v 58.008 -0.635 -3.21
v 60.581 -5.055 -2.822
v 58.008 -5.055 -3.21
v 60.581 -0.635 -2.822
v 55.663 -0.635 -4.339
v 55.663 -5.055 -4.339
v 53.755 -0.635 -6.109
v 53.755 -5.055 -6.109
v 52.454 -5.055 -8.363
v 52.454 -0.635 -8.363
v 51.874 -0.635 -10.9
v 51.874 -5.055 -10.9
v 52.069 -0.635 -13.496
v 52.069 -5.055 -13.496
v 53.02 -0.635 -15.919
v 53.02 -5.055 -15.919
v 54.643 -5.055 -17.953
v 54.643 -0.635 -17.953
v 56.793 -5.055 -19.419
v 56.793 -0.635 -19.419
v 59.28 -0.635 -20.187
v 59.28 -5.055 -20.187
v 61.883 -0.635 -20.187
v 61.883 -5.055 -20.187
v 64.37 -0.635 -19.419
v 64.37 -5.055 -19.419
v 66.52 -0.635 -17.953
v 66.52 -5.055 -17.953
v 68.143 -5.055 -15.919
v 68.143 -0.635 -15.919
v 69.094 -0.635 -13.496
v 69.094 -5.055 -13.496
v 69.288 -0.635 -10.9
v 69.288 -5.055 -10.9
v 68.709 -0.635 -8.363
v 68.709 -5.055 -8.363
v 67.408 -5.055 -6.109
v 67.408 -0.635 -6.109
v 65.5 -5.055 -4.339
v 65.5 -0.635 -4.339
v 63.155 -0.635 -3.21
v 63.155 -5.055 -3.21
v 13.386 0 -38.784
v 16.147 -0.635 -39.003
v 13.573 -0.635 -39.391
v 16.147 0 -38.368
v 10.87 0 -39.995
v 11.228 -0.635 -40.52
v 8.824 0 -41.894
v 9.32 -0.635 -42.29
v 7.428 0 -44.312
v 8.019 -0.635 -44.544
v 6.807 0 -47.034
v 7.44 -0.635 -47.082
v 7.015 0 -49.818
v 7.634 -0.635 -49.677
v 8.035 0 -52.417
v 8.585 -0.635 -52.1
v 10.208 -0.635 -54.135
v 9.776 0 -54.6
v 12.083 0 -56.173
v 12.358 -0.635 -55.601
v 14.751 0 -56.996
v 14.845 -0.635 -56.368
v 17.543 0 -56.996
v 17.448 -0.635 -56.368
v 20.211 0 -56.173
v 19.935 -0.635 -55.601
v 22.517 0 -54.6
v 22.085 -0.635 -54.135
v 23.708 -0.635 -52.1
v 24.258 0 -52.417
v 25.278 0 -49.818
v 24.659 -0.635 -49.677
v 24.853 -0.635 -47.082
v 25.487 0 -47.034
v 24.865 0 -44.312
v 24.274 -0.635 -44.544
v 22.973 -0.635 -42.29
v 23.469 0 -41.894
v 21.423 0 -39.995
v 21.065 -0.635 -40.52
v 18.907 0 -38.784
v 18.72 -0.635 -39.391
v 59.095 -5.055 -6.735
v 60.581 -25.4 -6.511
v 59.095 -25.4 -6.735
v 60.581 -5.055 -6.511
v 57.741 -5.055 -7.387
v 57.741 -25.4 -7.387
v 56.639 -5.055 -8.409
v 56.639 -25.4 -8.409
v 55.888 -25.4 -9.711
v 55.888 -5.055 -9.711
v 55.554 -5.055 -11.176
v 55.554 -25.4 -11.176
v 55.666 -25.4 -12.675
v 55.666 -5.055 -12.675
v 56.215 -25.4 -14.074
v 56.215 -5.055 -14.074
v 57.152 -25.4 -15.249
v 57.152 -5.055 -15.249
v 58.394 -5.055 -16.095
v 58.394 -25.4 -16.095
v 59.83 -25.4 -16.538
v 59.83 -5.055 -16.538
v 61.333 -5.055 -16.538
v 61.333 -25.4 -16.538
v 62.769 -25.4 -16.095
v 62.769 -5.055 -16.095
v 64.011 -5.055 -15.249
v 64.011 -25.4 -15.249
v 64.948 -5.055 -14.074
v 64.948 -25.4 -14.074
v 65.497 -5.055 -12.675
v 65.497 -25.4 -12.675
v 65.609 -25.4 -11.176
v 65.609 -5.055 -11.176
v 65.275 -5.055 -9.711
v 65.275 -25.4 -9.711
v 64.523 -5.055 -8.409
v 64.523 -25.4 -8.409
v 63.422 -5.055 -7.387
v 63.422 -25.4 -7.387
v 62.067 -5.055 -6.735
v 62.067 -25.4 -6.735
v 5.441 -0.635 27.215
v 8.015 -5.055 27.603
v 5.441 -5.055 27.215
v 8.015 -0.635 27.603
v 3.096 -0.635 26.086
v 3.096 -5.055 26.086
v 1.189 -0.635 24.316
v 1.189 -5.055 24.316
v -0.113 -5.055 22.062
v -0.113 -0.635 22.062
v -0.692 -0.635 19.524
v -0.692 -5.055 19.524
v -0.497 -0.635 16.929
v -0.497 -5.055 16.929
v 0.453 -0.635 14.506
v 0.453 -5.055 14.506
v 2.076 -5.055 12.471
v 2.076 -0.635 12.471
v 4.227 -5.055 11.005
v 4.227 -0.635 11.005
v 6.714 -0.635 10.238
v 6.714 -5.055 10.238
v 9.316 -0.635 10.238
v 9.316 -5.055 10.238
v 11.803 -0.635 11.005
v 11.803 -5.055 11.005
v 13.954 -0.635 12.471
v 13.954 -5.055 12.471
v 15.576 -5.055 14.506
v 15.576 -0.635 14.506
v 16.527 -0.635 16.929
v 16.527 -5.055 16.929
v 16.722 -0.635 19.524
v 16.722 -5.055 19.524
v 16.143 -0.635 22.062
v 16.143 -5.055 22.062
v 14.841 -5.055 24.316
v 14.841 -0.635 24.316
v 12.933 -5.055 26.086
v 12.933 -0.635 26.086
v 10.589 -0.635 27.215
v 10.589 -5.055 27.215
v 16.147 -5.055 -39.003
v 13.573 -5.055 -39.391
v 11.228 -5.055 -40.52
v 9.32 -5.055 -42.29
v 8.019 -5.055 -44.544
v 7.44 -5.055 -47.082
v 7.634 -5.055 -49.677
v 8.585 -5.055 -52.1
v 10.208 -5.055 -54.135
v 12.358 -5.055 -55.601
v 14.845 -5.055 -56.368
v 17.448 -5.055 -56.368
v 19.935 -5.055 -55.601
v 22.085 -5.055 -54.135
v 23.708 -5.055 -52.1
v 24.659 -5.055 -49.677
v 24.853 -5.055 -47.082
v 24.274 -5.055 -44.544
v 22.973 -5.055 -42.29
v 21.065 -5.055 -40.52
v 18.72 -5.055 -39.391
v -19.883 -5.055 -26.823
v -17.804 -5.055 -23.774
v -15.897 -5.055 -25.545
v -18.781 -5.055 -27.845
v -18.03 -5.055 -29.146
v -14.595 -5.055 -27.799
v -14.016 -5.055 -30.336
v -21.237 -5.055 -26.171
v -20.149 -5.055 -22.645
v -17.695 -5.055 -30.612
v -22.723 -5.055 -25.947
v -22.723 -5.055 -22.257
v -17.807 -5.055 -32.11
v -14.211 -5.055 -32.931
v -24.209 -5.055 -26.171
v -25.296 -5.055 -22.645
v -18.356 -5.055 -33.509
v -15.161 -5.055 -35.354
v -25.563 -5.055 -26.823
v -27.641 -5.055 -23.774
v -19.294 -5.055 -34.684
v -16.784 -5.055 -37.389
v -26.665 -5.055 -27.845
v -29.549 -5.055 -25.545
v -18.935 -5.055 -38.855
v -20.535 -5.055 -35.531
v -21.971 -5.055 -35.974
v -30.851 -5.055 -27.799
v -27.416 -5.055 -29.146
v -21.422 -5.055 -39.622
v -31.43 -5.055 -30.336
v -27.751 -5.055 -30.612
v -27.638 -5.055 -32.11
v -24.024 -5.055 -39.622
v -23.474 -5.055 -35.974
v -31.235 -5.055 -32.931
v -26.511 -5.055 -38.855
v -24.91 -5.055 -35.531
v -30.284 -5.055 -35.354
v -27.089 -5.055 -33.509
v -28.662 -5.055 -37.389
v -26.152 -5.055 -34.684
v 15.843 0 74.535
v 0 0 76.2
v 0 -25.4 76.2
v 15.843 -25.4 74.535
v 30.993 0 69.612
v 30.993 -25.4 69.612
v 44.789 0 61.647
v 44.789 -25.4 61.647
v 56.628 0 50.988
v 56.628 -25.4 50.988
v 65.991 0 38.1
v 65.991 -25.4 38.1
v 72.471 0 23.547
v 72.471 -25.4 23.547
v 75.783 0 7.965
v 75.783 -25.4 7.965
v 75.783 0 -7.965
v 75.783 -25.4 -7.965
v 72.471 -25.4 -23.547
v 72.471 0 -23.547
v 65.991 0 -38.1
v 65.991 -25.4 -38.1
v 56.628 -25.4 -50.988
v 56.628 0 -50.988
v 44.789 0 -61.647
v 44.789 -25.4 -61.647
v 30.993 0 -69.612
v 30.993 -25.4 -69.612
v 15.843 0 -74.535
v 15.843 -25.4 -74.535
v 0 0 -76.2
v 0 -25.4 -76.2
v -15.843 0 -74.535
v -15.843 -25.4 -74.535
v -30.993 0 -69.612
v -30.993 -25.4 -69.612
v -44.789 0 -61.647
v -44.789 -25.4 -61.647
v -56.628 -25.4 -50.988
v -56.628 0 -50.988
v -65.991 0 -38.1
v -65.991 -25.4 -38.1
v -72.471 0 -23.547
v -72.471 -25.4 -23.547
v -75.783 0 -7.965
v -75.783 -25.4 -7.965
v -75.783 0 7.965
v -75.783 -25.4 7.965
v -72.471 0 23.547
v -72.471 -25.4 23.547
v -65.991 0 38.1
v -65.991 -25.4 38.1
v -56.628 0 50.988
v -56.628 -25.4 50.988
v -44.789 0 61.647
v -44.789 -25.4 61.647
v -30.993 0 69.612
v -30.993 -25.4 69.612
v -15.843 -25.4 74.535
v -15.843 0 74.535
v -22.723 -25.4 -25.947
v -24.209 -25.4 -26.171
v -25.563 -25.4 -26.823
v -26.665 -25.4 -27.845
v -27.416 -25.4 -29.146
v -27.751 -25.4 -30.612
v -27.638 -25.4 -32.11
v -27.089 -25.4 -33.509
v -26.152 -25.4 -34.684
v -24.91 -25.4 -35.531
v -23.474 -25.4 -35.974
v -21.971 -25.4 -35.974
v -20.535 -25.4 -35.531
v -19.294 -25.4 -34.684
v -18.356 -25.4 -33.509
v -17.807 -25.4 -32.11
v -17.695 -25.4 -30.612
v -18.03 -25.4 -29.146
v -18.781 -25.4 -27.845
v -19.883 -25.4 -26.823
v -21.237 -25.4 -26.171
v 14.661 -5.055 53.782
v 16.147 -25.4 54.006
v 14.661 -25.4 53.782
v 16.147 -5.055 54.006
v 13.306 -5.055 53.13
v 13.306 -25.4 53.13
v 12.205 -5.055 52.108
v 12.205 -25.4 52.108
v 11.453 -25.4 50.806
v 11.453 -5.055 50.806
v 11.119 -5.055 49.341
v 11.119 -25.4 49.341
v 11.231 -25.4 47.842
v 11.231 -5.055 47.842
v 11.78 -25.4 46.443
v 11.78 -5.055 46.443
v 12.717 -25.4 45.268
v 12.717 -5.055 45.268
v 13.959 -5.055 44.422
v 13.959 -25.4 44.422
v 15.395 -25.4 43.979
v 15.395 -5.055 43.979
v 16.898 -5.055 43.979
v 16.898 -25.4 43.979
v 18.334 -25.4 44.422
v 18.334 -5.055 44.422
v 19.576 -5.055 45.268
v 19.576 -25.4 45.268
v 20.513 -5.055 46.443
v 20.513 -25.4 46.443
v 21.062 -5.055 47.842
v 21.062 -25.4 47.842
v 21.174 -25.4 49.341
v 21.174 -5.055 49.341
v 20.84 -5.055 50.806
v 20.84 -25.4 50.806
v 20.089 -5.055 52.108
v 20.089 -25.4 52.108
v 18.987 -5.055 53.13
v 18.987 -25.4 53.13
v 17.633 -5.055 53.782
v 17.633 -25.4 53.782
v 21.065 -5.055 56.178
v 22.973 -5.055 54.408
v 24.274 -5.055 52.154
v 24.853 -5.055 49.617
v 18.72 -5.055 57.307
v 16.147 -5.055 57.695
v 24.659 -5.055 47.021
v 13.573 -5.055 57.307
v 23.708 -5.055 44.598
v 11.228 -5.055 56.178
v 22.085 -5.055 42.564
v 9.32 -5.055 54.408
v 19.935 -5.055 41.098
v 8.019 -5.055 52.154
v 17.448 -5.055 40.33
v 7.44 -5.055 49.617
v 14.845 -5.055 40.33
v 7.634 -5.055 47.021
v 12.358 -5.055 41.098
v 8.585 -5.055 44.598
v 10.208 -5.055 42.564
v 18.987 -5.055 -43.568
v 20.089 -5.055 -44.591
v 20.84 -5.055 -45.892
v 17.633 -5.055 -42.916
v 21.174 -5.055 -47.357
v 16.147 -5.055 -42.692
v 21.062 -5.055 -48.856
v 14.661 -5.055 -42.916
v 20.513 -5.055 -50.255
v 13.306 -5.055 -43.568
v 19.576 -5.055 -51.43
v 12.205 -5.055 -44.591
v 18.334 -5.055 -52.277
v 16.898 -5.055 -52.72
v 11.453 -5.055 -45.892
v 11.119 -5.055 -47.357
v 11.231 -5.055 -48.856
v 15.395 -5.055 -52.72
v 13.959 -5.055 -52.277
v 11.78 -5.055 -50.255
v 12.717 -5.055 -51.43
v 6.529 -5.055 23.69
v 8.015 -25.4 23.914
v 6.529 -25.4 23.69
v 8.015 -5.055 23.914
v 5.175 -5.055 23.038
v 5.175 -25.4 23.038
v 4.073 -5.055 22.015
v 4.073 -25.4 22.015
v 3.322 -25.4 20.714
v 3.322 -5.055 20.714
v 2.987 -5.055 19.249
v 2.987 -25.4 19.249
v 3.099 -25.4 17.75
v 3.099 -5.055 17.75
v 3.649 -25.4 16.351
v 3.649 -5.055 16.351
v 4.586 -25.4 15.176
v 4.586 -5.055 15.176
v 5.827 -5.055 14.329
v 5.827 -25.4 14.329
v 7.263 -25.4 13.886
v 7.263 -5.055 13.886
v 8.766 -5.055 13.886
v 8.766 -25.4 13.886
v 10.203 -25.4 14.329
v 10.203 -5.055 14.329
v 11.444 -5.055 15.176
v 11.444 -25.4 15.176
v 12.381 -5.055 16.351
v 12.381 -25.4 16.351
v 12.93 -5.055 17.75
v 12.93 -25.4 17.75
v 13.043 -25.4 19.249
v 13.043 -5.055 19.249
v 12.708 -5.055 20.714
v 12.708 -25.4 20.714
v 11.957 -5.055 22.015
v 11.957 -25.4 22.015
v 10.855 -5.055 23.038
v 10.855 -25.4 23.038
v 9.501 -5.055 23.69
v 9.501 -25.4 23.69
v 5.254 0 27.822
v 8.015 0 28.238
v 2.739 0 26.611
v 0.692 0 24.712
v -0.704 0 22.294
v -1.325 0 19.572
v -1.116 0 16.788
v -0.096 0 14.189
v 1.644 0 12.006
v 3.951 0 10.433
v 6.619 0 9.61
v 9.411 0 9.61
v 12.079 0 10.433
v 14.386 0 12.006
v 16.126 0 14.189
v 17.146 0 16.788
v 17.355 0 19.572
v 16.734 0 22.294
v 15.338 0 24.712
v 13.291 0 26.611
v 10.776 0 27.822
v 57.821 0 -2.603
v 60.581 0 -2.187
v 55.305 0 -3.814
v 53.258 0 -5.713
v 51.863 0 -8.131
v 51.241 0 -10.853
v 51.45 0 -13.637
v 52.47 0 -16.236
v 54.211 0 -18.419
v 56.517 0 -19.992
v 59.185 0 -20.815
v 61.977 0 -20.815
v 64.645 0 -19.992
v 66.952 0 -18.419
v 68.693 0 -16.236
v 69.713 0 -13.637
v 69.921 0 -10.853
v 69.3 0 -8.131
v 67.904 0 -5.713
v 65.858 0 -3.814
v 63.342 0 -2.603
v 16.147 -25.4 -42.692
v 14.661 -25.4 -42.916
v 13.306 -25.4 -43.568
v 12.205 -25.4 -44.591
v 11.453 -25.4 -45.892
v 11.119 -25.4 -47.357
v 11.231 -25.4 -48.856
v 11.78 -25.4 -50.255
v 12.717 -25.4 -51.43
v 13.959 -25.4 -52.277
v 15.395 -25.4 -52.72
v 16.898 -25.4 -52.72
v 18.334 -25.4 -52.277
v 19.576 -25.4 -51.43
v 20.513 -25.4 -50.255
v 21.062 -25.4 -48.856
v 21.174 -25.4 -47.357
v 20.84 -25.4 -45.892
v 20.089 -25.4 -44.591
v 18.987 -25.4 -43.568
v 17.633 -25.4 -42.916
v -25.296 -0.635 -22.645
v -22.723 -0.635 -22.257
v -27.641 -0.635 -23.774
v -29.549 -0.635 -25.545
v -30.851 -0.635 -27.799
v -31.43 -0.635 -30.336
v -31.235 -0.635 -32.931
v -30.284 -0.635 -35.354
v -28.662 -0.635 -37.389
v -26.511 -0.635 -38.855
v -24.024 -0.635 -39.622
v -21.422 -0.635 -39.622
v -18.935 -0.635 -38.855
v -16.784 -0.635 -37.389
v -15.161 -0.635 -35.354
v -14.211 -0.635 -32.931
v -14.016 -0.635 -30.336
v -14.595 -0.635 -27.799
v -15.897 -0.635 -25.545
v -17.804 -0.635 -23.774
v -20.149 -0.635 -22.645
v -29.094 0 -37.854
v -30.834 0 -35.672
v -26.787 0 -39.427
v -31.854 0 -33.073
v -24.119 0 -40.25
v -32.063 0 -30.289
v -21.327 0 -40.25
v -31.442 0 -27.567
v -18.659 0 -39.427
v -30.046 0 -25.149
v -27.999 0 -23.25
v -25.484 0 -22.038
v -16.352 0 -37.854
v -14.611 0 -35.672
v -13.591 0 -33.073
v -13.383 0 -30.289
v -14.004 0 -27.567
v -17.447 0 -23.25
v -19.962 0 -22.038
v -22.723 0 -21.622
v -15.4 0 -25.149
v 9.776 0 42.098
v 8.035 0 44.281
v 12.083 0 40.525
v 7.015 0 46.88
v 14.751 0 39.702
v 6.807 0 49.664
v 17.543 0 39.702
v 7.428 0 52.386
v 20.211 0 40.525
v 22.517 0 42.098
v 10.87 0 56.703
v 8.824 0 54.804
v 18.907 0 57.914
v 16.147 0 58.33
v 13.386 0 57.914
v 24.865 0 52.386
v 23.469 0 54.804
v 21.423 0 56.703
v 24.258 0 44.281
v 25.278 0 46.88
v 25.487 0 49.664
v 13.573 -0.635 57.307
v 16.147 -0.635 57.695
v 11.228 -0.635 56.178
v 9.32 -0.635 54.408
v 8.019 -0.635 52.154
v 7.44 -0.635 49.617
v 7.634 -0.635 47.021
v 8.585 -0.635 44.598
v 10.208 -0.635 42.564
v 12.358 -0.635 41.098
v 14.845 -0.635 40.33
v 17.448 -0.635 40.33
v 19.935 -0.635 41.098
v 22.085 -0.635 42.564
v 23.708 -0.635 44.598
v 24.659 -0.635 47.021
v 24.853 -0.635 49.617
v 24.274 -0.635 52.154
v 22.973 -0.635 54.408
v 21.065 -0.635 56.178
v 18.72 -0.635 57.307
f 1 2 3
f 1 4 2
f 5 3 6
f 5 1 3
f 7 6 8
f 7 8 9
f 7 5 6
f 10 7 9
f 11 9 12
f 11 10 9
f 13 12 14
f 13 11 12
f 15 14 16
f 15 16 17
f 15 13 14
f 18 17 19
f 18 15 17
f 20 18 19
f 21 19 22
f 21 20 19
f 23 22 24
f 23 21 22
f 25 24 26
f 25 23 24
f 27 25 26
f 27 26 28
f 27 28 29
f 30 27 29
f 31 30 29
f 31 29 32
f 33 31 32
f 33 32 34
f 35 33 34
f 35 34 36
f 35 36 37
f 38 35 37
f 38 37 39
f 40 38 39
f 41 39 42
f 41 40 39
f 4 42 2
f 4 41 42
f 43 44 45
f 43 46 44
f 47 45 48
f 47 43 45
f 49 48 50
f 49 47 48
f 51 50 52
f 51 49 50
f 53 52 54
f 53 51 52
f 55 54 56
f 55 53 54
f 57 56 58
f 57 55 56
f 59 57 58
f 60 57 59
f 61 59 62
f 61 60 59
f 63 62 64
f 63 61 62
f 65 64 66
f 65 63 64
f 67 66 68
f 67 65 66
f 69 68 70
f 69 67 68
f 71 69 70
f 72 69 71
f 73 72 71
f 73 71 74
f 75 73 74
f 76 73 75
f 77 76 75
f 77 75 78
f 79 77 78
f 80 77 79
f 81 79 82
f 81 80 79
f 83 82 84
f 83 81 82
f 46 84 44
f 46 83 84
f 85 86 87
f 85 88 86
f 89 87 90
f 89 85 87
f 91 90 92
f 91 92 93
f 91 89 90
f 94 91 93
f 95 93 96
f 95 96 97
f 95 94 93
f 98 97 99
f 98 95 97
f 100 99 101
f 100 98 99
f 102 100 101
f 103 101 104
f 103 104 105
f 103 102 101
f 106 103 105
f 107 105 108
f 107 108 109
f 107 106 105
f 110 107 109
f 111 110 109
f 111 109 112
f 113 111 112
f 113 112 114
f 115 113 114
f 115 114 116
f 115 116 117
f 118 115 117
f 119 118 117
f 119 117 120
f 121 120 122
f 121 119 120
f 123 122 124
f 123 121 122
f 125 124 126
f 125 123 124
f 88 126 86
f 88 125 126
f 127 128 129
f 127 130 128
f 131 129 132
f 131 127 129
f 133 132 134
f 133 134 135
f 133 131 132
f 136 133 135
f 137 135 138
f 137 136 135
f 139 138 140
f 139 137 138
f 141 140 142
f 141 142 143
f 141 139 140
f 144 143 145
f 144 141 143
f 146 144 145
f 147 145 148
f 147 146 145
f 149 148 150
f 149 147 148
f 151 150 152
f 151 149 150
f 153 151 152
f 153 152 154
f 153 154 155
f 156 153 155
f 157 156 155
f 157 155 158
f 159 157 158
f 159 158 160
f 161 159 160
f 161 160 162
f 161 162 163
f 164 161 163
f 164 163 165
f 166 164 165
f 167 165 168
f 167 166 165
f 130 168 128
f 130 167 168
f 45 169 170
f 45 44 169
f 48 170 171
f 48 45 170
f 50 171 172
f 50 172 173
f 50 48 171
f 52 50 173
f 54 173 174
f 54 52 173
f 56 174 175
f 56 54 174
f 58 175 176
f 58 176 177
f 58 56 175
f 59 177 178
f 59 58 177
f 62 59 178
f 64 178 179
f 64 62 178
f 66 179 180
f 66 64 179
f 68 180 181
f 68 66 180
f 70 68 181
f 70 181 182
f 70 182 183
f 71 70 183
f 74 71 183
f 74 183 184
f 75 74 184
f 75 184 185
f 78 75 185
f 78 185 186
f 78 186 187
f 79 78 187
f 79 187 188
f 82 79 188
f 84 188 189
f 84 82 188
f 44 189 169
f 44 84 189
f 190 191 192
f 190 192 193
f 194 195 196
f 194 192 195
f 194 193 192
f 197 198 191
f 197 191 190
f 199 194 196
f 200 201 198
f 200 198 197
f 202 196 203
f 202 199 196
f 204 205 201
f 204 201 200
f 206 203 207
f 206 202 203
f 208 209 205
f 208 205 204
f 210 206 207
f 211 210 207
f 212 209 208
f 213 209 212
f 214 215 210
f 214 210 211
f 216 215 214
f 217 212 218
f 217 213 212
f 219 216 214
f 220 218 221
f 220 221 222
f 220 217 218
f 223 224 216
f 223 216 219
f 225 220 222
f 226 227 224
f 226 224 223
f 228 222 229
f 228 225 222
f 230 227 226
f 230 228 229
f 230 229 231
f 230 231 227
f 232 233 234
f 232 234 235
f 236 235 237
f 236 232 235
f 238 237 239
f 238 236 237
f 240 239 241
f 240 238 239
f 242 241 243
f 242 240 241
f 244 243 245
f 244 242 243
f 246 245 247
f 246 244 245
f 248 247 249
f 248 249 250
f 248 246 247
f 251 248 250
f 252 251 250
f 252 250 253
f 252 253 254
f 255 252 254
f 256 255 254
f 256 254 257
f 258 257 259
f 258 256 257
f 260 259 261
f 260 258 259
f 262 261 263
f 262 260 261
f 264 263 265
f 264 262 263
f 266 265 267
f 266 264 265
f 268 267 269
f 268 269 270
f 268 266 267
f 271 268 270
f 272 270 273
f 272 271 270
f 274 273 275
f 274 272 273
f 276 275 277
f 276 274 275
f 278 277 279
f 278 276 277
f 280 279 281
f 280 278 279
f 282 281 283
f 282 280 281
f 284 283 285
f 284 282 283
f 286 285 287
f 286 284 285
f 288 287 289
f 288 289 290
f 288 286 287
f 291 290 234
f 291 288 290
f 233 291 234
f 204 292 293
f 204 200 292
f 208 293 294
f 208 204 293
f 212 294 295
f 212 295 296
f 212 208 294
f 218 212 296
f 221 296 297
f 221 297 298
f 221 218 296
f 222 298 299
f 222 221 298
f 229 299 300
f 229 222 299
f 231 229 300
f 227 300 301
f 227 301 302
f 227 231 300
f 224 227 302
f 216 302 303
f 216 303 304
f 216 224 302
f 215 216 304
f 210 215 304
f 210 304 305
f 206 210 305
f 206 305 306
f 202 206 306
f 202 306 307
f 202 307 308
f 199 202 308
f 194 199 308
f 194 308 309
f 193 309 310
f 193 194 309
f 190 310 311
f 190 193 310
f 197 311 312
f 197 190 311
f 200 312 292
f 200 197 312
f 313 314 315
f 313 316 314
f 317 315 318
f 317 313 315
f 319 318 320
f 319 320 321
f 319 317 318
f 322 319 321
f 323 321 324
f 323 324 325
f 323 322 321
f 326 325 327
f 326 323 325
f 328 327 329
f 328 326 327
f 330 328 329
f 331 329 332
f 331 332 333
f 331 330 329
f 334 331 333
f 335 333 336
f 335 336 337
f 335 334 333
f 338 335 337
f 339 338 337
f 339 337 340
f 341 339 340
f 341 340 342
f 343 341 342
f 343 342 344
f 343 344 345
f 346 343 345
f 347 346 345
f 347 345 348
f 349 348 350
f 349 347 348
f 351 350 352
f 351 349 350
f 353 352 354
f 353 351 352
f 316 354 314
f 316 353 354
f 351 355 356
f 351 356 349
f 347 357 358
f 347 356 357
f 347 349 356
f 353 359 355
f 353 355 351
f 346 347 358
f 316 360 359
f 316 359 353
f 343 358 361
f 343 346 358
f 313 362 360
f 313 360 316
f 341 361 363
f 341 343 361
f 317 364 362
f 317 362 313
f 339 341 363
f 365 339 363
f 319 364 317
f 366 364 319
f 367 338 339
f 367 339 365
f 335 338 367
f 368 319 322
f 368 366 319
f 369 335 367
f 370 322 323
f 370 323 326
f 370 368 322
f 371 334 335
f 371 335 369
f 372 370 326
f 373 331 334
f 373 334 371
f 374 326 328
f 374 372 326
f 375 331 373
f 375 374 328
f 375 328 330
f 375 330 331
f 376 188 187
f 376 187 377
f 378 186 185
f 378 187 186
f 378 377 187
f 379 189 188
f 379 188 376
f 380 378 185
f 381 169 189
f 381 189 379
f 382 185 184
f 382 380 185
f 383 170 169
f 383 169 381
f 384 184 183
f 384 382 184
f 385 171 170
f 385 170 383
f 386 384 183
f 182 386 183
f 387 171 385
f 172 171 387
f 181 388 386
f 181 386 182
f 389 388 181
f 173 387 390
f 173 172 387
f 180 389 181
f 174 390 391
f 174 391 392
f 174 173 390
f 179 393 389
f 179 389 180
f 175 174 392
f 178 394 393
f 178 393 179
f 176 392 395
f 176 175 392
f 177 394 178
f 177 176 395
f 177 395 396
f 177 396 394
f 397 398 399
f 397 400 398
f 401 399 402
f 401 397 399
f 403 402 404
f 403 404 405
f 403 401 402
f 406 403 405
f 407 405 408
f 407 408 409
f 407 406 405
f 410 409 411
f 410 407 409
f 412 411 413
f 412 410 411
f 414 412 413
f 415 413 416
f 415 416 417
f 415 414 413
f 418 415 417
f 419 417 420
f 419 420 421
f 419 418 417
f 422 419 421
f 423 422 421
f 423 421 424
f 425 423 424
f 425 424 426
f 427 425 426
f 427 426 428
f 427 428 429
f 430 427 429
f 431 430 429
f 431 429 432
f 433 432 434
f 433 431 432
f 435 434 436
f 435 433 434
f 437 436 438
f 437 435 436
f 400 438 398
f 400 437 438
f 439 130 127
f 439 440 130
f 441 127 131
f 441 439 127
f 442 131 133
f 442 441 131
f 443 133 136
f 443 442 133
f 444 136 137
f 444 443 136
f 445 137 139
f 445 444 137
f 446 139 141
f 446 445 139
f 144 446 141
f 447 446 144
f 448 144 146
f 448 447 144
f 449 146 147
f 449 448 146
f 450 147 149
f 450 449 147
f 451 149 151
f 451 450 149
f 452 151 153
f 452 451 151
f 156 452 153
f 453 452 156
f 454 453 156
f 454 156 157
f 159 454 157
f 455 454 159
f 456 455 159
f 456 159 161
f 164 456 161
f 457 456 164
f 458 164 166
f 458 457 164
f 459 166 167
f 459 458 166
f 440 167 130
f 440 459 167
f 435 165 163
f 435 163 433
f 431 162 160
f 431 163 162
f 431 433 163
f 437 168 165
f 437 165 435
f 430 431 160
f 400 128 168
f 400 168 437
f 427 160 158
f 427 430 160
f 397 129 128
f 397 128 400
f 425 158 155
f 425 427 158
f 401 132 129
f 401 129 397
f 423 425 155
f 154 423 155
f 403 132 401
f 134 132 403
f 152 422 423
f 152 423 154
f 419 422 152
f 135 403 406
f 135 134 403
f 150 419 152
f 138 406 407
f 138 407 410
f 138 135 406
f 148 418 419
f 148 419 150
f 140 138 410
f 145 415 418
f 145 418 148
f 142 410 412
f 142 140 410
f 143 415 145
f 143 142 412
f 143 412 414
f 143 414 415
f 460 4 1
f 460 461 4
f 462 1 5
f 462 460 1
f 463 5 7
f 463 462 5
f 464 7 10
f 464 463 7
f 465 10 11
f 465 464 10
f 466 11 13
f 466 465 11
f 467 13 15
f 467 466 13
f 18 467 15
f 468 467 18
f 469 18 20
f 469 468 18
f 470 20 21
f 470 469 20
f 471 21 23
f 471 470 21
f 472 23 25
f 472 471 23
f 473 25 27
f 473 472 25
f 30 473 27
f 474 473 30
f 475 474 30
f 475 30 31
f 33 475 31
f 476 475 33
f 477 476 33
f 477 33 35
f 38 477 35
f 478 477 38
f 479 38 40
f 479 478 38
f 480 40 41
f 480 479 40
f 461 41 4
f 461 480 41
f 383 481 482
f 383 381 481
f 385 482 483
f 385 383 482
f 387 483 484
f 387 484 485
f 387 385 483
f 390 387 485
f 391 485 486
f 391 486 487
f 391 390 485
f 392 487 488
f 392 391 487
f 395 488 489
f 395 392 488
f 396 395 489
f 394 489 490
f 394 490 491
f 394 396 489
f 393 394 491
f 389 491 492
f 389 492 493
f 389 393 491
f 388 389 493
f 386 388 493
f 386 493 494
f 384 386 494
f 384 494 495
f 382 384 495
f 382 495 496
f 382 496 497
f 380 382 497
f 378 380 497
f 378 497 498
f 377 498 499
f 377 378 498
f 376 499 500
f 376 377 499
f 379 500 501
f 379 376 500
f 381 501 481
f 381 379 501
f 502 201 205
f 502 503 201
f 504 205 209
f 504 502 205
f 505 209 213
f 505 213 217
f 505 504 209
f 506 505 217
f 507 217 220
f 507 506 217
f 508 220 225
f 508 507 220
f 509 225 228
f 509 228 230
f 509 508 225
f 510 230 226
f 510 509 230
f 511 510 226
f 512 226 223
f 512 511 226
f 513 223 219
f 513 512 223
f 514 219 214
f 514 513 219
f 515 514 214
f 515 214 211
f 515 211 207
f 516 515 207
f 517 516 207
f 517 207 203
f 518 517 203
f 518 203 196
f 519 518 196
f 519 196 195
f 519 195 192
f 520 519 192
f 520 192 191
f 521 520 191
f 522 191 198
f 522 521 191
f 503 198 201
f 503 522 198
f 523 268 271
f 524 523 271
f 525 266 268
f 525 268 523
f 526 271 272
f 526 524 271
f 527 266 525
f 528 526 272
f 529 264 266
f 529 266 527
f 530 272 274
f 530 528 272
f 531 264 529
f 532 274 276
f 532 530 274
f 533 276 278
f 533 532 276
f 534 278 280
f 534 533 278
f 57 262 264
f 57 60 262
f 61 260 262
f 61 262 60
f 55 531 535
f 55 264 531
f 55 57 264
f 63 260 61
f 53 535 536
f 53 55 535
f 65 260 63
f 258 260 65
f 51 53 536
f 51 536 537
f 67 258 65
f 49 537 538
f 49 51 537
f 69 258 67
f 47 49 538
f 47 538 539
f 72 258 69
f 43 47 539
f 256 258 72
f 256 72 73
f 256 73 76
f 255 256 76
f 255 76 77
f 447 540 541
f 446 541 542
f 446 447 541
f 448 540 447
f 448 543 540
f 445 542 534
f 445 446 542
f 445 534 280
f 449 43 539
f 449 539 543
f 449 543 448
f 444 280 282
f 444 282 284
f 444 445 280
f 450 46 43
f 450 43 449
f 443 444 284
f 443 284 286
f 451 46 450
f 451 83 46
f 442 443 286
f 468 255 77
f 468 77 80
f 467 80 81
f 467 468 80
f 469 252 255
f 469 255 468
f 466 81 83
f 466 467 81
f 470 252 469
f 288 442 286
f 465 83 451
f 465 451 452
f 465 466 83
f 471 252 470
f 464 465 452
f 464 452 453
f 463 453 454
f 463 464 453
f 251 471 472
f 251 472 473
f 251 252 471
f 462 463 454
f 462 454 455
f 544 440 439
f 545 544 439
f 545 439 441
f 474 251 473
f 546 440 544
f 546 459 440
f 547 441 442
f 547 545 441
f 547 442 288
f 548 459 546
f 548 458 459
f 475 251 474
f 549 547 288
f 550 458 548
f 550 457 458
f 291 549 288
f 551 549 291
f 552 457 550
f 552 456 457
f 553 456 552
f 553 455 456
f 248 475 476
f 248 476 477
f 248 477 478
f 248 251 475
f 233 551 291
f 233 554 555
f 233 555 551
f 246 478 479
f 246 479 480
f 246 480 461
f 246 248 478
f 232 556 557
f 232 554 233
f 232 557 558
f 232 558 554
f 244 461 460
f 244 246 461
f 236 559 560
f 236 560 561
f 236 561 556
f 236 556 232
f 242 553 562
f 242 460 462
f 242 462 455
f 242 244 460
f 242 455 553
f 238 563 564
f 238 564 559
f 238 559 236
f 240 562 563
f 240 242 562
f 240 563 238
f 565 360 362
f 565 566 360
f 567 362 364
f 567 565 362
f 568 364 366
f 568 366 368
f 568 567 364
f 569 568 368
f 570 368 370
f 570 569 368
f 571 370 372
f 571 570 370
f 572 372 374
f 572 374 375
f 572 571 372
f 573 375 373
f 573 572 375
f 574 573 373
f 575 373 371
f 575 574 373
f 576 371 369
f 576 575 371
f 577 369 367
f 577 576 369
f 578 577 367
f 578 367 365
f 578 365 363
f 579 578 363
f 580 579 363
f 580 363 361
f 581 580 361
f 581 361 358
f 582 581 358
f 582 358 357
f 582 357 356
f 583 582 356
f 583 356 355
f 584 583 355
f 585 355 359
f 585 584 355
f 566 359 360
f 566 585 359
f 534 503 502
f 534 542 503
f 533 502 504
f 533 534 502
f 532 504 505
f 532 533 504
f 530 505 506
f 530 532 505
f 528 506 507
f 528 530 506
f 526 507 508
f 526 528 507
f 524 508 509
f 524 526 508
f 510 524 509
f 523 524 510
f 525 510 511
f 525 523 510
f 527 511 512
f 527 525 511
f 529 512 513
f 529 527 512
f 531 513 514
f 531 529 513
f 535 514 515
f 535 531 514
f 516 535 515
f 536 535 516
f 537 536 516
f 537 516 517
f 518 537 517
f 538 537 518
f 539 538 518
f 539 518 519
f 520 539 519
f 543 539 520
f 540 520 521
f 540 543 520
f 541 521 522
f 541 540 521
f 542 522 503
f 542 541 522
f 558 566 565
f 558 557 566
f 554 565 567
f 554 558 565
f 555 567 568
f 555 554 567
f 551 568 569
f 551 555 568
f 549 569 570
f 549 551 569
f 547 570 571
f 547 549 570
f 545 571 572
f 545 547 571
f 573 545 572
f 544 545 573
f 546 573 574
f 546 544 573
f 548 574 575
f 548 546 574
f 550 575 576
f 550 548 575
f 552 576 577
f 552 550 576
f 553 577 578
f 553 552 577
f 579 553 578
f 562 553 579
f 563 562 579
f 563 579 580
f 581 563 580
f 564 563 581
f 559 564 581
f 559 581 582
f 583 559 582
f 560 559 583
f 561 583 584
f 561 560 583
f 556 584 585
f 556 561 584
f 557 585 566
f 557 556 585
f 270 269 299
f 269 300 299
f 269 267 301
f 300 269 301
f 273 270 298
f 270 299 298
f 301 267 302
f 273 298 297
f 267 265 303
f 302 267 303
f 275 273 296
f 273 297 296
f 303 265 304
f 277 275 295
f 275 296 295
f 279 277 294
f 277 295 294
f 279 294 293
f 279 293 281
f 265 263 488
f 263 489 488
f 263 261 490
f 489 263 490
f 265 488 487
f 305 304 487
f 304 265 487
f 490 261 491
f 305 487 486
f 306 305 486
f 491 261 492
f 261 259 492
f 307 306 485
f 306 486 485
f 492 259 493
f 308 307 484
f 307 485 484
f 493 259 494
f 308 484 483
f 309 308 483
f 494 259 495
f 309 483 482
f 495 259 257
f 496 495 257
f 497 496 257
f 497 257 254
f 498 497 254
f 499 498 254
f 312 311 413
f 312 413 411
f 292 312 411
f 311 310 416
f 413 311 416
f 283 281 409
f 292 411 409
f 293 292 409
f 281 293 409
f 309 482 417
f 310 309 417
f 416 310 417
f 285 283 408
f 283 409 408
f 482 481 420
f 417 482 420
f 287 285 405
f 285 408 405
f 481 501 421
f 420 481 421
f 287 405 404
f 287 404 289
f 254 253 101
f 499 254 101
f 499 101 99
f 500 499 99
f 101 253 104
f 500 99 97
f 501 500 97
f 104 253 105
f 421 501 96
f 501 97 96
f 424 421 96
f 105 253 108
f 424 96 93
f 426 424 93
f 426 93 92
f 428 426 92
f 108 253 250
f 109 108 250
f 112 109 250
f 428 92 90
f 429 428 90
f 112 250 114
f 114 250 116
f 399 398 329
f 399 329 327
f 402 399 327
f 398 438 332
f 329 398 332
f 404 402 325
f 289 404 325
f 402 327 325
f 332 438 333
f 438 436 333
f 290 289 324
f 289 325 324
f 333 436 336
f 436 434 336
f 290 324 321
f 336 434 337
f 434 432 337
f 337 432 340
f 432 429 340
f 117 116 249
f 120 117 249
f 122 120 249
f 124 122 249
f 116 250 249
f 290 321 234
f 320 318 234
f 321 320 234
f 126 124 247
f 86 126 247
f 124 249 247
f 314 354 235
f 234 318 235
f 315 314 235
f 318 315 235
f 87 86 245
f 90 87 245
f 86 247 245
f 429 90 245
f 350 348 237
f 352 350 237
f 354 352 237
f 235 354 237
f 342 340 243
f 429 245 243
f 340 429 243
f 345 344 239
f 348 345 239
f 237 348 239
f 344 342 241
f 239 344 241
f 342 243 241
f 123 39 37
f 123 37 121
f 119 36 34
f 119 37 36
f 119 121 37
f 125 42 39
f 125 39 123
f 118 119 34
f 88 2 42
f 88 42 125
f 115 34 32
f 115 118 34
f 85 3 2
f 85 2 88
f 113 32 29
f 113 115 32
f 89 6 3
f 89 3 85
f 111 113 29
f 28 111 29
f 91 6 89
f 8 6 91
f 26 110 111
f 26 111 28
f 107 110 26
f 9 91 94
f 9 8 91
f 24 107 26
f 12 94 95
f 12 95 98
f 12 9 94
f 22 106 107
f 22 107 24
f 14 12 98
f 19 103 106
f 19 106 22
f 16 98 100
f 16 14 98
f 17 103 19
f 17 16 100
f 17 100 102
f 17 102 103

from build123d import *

# Parameters (mm, degrees)
SKETCH1_R                                     = 76.2
BOSS_EXTRUDE1_DEPTH                           = 25.4
CBORE_FOR_3_8_BUTTON_HEAD_CAP_SCREW1_AT_COUNT = 2
CBORE_FOR_3_8_BUTTON_HEAD_CAP_SCREW1_AT_PITCH = 75.078270051
CBORE_FOR_3_8_BUTTON_HEAD_CAP_SCREW1_2_COUNT  = 2
CBORE_FOR_3_8_BUTTON_HEAD_CAP_SCREW1_2_PITCH  = 60.736241383
CBORE_FOR_3_8_BUTTON_HEAD_CAP_SCREW1_3_COUNT  = 2
CBORE_FOR_3_8_BUTTON_HEAD_CAP_SCREW1_3_PITCH  = 85.541398896
CBORE_FOR_3_8_BUTTON_HEAD_CAP_SCREW1_4_COUNT  = 2
CBORE_FOR_3_8_BUTTON_HEAD_CAP_SCREW1_4_PITCH  = 57.302034519


with BuildPart() as part:
    # Sketch1 → Boss-Extrude1 (new body)
    with BuildSketch(Plane(origin=(0, 0, 0), x_dir=(1, 0, 0), z_dir=(0, 1, 0))):
        with Locations(Location((0, 0, 0), (0, 0, 270))):
            Circle(SKETCH1_R)
    extrude(amount=-BOSS_EXTRUDE1_DEPTH)

    # Sketch4 → CBORE for 3/8 Button Head Cap Screw1 (revolve, cut)
    with BuildSketch(Plane(origin=(60.58130803, 0, -11.552884304), x_dir=(0, 0, 1), z_dir=(1, 0, 0))):
        Polygon((0, 0), (0, 25.4), (5.0419, 25.4), (5.0419, 5.0546), (8.73125, 5.0546), (8.73125, 0.635), (9.36625, 0), align=None)
    cbore_for_3_8_button_head_cap_screw1 = revolve(axis=Axis((60.58130803, 6.35, -11.552884304), (0, -1, 0)), mode=Mode.SUBTRACT)

    # CBORE for 3/8 Button Head Cap Screw1 at: CBORE for 3/8 Button Head Cap Screw1 ×2
    with Locations(*[Vector(-0.5918446125142773, 0, 0.8060520793582913) * (i * CBORE_FOR_3_8_BUTTON_HEAD_CAP_SCREW1_AT_PITCH) for i in range(1, CBORE_FOR_3_8_BUTTON_HEAD_CAP_SCREW1_AT_COUNT)]):
        add(cbore_for_3_8_button_head_cap_screw1, mode=Mode.SUBTRACT)

    # CBORE for 3_8 Button Head Cap Screw1 2: CBORE for 3/8 Button Head Cap Screw1 ×2
    with Locations(*[Vector(-0.8654863573421582, 0, 0.5009324957063599) * (i * CBORE_FOR_3_8_BUTTON_HEAD_CAP_SCREW1_2_PITCH) for i in range(1, CBORE_FOR_3_8_BUTTON_HEAD_CAP_SCREW1_2_COUNT)]):
        add(cbore_for_3_8_button_head_cap_screw1, mode=Mode.SUBTRACT)

    # CBORE for 3_8 Button Head Cap Screw1 3: CBORE for 3/8 Button Head Cap Screw1 ×2
    with Locations(*[Vector(-0.9738464853959384, 0, -0.22720700447384592) * (i * CBORE_FOR_3_8_BUTTON_HEAD_CAP_SCREW1_3_PITCH) for i in range(1, CBORE_FOR_3_8_BUTTON_HEAD_CAP_SCREW1_3_COUNT)]):
        add(cbore_for_3_8_button_head_cap_screw1, mode=Mode.SUBTRACT)

    # CBORE for 3_8 Button Head Cap Screw1 4: CBORE for 3/8 Button Head Cap Screw1 ×2
    with Locations(*[Vector(-0.7754466315152058, 0, -0.6314131149031676) * (i * CBORE_FOR_3_8_BUTTON_HEAD_CAP_SCREW1_4_PITCH) for i in range(1, CBORE_FOR_3_8_BUTTON_HEAD_CAP_SCREW1_4_COUNT)]):
        add(cbore_for_3_8_button_head_cap_screw1, mode=Mode.SUBTRACT)


solid = part.part
